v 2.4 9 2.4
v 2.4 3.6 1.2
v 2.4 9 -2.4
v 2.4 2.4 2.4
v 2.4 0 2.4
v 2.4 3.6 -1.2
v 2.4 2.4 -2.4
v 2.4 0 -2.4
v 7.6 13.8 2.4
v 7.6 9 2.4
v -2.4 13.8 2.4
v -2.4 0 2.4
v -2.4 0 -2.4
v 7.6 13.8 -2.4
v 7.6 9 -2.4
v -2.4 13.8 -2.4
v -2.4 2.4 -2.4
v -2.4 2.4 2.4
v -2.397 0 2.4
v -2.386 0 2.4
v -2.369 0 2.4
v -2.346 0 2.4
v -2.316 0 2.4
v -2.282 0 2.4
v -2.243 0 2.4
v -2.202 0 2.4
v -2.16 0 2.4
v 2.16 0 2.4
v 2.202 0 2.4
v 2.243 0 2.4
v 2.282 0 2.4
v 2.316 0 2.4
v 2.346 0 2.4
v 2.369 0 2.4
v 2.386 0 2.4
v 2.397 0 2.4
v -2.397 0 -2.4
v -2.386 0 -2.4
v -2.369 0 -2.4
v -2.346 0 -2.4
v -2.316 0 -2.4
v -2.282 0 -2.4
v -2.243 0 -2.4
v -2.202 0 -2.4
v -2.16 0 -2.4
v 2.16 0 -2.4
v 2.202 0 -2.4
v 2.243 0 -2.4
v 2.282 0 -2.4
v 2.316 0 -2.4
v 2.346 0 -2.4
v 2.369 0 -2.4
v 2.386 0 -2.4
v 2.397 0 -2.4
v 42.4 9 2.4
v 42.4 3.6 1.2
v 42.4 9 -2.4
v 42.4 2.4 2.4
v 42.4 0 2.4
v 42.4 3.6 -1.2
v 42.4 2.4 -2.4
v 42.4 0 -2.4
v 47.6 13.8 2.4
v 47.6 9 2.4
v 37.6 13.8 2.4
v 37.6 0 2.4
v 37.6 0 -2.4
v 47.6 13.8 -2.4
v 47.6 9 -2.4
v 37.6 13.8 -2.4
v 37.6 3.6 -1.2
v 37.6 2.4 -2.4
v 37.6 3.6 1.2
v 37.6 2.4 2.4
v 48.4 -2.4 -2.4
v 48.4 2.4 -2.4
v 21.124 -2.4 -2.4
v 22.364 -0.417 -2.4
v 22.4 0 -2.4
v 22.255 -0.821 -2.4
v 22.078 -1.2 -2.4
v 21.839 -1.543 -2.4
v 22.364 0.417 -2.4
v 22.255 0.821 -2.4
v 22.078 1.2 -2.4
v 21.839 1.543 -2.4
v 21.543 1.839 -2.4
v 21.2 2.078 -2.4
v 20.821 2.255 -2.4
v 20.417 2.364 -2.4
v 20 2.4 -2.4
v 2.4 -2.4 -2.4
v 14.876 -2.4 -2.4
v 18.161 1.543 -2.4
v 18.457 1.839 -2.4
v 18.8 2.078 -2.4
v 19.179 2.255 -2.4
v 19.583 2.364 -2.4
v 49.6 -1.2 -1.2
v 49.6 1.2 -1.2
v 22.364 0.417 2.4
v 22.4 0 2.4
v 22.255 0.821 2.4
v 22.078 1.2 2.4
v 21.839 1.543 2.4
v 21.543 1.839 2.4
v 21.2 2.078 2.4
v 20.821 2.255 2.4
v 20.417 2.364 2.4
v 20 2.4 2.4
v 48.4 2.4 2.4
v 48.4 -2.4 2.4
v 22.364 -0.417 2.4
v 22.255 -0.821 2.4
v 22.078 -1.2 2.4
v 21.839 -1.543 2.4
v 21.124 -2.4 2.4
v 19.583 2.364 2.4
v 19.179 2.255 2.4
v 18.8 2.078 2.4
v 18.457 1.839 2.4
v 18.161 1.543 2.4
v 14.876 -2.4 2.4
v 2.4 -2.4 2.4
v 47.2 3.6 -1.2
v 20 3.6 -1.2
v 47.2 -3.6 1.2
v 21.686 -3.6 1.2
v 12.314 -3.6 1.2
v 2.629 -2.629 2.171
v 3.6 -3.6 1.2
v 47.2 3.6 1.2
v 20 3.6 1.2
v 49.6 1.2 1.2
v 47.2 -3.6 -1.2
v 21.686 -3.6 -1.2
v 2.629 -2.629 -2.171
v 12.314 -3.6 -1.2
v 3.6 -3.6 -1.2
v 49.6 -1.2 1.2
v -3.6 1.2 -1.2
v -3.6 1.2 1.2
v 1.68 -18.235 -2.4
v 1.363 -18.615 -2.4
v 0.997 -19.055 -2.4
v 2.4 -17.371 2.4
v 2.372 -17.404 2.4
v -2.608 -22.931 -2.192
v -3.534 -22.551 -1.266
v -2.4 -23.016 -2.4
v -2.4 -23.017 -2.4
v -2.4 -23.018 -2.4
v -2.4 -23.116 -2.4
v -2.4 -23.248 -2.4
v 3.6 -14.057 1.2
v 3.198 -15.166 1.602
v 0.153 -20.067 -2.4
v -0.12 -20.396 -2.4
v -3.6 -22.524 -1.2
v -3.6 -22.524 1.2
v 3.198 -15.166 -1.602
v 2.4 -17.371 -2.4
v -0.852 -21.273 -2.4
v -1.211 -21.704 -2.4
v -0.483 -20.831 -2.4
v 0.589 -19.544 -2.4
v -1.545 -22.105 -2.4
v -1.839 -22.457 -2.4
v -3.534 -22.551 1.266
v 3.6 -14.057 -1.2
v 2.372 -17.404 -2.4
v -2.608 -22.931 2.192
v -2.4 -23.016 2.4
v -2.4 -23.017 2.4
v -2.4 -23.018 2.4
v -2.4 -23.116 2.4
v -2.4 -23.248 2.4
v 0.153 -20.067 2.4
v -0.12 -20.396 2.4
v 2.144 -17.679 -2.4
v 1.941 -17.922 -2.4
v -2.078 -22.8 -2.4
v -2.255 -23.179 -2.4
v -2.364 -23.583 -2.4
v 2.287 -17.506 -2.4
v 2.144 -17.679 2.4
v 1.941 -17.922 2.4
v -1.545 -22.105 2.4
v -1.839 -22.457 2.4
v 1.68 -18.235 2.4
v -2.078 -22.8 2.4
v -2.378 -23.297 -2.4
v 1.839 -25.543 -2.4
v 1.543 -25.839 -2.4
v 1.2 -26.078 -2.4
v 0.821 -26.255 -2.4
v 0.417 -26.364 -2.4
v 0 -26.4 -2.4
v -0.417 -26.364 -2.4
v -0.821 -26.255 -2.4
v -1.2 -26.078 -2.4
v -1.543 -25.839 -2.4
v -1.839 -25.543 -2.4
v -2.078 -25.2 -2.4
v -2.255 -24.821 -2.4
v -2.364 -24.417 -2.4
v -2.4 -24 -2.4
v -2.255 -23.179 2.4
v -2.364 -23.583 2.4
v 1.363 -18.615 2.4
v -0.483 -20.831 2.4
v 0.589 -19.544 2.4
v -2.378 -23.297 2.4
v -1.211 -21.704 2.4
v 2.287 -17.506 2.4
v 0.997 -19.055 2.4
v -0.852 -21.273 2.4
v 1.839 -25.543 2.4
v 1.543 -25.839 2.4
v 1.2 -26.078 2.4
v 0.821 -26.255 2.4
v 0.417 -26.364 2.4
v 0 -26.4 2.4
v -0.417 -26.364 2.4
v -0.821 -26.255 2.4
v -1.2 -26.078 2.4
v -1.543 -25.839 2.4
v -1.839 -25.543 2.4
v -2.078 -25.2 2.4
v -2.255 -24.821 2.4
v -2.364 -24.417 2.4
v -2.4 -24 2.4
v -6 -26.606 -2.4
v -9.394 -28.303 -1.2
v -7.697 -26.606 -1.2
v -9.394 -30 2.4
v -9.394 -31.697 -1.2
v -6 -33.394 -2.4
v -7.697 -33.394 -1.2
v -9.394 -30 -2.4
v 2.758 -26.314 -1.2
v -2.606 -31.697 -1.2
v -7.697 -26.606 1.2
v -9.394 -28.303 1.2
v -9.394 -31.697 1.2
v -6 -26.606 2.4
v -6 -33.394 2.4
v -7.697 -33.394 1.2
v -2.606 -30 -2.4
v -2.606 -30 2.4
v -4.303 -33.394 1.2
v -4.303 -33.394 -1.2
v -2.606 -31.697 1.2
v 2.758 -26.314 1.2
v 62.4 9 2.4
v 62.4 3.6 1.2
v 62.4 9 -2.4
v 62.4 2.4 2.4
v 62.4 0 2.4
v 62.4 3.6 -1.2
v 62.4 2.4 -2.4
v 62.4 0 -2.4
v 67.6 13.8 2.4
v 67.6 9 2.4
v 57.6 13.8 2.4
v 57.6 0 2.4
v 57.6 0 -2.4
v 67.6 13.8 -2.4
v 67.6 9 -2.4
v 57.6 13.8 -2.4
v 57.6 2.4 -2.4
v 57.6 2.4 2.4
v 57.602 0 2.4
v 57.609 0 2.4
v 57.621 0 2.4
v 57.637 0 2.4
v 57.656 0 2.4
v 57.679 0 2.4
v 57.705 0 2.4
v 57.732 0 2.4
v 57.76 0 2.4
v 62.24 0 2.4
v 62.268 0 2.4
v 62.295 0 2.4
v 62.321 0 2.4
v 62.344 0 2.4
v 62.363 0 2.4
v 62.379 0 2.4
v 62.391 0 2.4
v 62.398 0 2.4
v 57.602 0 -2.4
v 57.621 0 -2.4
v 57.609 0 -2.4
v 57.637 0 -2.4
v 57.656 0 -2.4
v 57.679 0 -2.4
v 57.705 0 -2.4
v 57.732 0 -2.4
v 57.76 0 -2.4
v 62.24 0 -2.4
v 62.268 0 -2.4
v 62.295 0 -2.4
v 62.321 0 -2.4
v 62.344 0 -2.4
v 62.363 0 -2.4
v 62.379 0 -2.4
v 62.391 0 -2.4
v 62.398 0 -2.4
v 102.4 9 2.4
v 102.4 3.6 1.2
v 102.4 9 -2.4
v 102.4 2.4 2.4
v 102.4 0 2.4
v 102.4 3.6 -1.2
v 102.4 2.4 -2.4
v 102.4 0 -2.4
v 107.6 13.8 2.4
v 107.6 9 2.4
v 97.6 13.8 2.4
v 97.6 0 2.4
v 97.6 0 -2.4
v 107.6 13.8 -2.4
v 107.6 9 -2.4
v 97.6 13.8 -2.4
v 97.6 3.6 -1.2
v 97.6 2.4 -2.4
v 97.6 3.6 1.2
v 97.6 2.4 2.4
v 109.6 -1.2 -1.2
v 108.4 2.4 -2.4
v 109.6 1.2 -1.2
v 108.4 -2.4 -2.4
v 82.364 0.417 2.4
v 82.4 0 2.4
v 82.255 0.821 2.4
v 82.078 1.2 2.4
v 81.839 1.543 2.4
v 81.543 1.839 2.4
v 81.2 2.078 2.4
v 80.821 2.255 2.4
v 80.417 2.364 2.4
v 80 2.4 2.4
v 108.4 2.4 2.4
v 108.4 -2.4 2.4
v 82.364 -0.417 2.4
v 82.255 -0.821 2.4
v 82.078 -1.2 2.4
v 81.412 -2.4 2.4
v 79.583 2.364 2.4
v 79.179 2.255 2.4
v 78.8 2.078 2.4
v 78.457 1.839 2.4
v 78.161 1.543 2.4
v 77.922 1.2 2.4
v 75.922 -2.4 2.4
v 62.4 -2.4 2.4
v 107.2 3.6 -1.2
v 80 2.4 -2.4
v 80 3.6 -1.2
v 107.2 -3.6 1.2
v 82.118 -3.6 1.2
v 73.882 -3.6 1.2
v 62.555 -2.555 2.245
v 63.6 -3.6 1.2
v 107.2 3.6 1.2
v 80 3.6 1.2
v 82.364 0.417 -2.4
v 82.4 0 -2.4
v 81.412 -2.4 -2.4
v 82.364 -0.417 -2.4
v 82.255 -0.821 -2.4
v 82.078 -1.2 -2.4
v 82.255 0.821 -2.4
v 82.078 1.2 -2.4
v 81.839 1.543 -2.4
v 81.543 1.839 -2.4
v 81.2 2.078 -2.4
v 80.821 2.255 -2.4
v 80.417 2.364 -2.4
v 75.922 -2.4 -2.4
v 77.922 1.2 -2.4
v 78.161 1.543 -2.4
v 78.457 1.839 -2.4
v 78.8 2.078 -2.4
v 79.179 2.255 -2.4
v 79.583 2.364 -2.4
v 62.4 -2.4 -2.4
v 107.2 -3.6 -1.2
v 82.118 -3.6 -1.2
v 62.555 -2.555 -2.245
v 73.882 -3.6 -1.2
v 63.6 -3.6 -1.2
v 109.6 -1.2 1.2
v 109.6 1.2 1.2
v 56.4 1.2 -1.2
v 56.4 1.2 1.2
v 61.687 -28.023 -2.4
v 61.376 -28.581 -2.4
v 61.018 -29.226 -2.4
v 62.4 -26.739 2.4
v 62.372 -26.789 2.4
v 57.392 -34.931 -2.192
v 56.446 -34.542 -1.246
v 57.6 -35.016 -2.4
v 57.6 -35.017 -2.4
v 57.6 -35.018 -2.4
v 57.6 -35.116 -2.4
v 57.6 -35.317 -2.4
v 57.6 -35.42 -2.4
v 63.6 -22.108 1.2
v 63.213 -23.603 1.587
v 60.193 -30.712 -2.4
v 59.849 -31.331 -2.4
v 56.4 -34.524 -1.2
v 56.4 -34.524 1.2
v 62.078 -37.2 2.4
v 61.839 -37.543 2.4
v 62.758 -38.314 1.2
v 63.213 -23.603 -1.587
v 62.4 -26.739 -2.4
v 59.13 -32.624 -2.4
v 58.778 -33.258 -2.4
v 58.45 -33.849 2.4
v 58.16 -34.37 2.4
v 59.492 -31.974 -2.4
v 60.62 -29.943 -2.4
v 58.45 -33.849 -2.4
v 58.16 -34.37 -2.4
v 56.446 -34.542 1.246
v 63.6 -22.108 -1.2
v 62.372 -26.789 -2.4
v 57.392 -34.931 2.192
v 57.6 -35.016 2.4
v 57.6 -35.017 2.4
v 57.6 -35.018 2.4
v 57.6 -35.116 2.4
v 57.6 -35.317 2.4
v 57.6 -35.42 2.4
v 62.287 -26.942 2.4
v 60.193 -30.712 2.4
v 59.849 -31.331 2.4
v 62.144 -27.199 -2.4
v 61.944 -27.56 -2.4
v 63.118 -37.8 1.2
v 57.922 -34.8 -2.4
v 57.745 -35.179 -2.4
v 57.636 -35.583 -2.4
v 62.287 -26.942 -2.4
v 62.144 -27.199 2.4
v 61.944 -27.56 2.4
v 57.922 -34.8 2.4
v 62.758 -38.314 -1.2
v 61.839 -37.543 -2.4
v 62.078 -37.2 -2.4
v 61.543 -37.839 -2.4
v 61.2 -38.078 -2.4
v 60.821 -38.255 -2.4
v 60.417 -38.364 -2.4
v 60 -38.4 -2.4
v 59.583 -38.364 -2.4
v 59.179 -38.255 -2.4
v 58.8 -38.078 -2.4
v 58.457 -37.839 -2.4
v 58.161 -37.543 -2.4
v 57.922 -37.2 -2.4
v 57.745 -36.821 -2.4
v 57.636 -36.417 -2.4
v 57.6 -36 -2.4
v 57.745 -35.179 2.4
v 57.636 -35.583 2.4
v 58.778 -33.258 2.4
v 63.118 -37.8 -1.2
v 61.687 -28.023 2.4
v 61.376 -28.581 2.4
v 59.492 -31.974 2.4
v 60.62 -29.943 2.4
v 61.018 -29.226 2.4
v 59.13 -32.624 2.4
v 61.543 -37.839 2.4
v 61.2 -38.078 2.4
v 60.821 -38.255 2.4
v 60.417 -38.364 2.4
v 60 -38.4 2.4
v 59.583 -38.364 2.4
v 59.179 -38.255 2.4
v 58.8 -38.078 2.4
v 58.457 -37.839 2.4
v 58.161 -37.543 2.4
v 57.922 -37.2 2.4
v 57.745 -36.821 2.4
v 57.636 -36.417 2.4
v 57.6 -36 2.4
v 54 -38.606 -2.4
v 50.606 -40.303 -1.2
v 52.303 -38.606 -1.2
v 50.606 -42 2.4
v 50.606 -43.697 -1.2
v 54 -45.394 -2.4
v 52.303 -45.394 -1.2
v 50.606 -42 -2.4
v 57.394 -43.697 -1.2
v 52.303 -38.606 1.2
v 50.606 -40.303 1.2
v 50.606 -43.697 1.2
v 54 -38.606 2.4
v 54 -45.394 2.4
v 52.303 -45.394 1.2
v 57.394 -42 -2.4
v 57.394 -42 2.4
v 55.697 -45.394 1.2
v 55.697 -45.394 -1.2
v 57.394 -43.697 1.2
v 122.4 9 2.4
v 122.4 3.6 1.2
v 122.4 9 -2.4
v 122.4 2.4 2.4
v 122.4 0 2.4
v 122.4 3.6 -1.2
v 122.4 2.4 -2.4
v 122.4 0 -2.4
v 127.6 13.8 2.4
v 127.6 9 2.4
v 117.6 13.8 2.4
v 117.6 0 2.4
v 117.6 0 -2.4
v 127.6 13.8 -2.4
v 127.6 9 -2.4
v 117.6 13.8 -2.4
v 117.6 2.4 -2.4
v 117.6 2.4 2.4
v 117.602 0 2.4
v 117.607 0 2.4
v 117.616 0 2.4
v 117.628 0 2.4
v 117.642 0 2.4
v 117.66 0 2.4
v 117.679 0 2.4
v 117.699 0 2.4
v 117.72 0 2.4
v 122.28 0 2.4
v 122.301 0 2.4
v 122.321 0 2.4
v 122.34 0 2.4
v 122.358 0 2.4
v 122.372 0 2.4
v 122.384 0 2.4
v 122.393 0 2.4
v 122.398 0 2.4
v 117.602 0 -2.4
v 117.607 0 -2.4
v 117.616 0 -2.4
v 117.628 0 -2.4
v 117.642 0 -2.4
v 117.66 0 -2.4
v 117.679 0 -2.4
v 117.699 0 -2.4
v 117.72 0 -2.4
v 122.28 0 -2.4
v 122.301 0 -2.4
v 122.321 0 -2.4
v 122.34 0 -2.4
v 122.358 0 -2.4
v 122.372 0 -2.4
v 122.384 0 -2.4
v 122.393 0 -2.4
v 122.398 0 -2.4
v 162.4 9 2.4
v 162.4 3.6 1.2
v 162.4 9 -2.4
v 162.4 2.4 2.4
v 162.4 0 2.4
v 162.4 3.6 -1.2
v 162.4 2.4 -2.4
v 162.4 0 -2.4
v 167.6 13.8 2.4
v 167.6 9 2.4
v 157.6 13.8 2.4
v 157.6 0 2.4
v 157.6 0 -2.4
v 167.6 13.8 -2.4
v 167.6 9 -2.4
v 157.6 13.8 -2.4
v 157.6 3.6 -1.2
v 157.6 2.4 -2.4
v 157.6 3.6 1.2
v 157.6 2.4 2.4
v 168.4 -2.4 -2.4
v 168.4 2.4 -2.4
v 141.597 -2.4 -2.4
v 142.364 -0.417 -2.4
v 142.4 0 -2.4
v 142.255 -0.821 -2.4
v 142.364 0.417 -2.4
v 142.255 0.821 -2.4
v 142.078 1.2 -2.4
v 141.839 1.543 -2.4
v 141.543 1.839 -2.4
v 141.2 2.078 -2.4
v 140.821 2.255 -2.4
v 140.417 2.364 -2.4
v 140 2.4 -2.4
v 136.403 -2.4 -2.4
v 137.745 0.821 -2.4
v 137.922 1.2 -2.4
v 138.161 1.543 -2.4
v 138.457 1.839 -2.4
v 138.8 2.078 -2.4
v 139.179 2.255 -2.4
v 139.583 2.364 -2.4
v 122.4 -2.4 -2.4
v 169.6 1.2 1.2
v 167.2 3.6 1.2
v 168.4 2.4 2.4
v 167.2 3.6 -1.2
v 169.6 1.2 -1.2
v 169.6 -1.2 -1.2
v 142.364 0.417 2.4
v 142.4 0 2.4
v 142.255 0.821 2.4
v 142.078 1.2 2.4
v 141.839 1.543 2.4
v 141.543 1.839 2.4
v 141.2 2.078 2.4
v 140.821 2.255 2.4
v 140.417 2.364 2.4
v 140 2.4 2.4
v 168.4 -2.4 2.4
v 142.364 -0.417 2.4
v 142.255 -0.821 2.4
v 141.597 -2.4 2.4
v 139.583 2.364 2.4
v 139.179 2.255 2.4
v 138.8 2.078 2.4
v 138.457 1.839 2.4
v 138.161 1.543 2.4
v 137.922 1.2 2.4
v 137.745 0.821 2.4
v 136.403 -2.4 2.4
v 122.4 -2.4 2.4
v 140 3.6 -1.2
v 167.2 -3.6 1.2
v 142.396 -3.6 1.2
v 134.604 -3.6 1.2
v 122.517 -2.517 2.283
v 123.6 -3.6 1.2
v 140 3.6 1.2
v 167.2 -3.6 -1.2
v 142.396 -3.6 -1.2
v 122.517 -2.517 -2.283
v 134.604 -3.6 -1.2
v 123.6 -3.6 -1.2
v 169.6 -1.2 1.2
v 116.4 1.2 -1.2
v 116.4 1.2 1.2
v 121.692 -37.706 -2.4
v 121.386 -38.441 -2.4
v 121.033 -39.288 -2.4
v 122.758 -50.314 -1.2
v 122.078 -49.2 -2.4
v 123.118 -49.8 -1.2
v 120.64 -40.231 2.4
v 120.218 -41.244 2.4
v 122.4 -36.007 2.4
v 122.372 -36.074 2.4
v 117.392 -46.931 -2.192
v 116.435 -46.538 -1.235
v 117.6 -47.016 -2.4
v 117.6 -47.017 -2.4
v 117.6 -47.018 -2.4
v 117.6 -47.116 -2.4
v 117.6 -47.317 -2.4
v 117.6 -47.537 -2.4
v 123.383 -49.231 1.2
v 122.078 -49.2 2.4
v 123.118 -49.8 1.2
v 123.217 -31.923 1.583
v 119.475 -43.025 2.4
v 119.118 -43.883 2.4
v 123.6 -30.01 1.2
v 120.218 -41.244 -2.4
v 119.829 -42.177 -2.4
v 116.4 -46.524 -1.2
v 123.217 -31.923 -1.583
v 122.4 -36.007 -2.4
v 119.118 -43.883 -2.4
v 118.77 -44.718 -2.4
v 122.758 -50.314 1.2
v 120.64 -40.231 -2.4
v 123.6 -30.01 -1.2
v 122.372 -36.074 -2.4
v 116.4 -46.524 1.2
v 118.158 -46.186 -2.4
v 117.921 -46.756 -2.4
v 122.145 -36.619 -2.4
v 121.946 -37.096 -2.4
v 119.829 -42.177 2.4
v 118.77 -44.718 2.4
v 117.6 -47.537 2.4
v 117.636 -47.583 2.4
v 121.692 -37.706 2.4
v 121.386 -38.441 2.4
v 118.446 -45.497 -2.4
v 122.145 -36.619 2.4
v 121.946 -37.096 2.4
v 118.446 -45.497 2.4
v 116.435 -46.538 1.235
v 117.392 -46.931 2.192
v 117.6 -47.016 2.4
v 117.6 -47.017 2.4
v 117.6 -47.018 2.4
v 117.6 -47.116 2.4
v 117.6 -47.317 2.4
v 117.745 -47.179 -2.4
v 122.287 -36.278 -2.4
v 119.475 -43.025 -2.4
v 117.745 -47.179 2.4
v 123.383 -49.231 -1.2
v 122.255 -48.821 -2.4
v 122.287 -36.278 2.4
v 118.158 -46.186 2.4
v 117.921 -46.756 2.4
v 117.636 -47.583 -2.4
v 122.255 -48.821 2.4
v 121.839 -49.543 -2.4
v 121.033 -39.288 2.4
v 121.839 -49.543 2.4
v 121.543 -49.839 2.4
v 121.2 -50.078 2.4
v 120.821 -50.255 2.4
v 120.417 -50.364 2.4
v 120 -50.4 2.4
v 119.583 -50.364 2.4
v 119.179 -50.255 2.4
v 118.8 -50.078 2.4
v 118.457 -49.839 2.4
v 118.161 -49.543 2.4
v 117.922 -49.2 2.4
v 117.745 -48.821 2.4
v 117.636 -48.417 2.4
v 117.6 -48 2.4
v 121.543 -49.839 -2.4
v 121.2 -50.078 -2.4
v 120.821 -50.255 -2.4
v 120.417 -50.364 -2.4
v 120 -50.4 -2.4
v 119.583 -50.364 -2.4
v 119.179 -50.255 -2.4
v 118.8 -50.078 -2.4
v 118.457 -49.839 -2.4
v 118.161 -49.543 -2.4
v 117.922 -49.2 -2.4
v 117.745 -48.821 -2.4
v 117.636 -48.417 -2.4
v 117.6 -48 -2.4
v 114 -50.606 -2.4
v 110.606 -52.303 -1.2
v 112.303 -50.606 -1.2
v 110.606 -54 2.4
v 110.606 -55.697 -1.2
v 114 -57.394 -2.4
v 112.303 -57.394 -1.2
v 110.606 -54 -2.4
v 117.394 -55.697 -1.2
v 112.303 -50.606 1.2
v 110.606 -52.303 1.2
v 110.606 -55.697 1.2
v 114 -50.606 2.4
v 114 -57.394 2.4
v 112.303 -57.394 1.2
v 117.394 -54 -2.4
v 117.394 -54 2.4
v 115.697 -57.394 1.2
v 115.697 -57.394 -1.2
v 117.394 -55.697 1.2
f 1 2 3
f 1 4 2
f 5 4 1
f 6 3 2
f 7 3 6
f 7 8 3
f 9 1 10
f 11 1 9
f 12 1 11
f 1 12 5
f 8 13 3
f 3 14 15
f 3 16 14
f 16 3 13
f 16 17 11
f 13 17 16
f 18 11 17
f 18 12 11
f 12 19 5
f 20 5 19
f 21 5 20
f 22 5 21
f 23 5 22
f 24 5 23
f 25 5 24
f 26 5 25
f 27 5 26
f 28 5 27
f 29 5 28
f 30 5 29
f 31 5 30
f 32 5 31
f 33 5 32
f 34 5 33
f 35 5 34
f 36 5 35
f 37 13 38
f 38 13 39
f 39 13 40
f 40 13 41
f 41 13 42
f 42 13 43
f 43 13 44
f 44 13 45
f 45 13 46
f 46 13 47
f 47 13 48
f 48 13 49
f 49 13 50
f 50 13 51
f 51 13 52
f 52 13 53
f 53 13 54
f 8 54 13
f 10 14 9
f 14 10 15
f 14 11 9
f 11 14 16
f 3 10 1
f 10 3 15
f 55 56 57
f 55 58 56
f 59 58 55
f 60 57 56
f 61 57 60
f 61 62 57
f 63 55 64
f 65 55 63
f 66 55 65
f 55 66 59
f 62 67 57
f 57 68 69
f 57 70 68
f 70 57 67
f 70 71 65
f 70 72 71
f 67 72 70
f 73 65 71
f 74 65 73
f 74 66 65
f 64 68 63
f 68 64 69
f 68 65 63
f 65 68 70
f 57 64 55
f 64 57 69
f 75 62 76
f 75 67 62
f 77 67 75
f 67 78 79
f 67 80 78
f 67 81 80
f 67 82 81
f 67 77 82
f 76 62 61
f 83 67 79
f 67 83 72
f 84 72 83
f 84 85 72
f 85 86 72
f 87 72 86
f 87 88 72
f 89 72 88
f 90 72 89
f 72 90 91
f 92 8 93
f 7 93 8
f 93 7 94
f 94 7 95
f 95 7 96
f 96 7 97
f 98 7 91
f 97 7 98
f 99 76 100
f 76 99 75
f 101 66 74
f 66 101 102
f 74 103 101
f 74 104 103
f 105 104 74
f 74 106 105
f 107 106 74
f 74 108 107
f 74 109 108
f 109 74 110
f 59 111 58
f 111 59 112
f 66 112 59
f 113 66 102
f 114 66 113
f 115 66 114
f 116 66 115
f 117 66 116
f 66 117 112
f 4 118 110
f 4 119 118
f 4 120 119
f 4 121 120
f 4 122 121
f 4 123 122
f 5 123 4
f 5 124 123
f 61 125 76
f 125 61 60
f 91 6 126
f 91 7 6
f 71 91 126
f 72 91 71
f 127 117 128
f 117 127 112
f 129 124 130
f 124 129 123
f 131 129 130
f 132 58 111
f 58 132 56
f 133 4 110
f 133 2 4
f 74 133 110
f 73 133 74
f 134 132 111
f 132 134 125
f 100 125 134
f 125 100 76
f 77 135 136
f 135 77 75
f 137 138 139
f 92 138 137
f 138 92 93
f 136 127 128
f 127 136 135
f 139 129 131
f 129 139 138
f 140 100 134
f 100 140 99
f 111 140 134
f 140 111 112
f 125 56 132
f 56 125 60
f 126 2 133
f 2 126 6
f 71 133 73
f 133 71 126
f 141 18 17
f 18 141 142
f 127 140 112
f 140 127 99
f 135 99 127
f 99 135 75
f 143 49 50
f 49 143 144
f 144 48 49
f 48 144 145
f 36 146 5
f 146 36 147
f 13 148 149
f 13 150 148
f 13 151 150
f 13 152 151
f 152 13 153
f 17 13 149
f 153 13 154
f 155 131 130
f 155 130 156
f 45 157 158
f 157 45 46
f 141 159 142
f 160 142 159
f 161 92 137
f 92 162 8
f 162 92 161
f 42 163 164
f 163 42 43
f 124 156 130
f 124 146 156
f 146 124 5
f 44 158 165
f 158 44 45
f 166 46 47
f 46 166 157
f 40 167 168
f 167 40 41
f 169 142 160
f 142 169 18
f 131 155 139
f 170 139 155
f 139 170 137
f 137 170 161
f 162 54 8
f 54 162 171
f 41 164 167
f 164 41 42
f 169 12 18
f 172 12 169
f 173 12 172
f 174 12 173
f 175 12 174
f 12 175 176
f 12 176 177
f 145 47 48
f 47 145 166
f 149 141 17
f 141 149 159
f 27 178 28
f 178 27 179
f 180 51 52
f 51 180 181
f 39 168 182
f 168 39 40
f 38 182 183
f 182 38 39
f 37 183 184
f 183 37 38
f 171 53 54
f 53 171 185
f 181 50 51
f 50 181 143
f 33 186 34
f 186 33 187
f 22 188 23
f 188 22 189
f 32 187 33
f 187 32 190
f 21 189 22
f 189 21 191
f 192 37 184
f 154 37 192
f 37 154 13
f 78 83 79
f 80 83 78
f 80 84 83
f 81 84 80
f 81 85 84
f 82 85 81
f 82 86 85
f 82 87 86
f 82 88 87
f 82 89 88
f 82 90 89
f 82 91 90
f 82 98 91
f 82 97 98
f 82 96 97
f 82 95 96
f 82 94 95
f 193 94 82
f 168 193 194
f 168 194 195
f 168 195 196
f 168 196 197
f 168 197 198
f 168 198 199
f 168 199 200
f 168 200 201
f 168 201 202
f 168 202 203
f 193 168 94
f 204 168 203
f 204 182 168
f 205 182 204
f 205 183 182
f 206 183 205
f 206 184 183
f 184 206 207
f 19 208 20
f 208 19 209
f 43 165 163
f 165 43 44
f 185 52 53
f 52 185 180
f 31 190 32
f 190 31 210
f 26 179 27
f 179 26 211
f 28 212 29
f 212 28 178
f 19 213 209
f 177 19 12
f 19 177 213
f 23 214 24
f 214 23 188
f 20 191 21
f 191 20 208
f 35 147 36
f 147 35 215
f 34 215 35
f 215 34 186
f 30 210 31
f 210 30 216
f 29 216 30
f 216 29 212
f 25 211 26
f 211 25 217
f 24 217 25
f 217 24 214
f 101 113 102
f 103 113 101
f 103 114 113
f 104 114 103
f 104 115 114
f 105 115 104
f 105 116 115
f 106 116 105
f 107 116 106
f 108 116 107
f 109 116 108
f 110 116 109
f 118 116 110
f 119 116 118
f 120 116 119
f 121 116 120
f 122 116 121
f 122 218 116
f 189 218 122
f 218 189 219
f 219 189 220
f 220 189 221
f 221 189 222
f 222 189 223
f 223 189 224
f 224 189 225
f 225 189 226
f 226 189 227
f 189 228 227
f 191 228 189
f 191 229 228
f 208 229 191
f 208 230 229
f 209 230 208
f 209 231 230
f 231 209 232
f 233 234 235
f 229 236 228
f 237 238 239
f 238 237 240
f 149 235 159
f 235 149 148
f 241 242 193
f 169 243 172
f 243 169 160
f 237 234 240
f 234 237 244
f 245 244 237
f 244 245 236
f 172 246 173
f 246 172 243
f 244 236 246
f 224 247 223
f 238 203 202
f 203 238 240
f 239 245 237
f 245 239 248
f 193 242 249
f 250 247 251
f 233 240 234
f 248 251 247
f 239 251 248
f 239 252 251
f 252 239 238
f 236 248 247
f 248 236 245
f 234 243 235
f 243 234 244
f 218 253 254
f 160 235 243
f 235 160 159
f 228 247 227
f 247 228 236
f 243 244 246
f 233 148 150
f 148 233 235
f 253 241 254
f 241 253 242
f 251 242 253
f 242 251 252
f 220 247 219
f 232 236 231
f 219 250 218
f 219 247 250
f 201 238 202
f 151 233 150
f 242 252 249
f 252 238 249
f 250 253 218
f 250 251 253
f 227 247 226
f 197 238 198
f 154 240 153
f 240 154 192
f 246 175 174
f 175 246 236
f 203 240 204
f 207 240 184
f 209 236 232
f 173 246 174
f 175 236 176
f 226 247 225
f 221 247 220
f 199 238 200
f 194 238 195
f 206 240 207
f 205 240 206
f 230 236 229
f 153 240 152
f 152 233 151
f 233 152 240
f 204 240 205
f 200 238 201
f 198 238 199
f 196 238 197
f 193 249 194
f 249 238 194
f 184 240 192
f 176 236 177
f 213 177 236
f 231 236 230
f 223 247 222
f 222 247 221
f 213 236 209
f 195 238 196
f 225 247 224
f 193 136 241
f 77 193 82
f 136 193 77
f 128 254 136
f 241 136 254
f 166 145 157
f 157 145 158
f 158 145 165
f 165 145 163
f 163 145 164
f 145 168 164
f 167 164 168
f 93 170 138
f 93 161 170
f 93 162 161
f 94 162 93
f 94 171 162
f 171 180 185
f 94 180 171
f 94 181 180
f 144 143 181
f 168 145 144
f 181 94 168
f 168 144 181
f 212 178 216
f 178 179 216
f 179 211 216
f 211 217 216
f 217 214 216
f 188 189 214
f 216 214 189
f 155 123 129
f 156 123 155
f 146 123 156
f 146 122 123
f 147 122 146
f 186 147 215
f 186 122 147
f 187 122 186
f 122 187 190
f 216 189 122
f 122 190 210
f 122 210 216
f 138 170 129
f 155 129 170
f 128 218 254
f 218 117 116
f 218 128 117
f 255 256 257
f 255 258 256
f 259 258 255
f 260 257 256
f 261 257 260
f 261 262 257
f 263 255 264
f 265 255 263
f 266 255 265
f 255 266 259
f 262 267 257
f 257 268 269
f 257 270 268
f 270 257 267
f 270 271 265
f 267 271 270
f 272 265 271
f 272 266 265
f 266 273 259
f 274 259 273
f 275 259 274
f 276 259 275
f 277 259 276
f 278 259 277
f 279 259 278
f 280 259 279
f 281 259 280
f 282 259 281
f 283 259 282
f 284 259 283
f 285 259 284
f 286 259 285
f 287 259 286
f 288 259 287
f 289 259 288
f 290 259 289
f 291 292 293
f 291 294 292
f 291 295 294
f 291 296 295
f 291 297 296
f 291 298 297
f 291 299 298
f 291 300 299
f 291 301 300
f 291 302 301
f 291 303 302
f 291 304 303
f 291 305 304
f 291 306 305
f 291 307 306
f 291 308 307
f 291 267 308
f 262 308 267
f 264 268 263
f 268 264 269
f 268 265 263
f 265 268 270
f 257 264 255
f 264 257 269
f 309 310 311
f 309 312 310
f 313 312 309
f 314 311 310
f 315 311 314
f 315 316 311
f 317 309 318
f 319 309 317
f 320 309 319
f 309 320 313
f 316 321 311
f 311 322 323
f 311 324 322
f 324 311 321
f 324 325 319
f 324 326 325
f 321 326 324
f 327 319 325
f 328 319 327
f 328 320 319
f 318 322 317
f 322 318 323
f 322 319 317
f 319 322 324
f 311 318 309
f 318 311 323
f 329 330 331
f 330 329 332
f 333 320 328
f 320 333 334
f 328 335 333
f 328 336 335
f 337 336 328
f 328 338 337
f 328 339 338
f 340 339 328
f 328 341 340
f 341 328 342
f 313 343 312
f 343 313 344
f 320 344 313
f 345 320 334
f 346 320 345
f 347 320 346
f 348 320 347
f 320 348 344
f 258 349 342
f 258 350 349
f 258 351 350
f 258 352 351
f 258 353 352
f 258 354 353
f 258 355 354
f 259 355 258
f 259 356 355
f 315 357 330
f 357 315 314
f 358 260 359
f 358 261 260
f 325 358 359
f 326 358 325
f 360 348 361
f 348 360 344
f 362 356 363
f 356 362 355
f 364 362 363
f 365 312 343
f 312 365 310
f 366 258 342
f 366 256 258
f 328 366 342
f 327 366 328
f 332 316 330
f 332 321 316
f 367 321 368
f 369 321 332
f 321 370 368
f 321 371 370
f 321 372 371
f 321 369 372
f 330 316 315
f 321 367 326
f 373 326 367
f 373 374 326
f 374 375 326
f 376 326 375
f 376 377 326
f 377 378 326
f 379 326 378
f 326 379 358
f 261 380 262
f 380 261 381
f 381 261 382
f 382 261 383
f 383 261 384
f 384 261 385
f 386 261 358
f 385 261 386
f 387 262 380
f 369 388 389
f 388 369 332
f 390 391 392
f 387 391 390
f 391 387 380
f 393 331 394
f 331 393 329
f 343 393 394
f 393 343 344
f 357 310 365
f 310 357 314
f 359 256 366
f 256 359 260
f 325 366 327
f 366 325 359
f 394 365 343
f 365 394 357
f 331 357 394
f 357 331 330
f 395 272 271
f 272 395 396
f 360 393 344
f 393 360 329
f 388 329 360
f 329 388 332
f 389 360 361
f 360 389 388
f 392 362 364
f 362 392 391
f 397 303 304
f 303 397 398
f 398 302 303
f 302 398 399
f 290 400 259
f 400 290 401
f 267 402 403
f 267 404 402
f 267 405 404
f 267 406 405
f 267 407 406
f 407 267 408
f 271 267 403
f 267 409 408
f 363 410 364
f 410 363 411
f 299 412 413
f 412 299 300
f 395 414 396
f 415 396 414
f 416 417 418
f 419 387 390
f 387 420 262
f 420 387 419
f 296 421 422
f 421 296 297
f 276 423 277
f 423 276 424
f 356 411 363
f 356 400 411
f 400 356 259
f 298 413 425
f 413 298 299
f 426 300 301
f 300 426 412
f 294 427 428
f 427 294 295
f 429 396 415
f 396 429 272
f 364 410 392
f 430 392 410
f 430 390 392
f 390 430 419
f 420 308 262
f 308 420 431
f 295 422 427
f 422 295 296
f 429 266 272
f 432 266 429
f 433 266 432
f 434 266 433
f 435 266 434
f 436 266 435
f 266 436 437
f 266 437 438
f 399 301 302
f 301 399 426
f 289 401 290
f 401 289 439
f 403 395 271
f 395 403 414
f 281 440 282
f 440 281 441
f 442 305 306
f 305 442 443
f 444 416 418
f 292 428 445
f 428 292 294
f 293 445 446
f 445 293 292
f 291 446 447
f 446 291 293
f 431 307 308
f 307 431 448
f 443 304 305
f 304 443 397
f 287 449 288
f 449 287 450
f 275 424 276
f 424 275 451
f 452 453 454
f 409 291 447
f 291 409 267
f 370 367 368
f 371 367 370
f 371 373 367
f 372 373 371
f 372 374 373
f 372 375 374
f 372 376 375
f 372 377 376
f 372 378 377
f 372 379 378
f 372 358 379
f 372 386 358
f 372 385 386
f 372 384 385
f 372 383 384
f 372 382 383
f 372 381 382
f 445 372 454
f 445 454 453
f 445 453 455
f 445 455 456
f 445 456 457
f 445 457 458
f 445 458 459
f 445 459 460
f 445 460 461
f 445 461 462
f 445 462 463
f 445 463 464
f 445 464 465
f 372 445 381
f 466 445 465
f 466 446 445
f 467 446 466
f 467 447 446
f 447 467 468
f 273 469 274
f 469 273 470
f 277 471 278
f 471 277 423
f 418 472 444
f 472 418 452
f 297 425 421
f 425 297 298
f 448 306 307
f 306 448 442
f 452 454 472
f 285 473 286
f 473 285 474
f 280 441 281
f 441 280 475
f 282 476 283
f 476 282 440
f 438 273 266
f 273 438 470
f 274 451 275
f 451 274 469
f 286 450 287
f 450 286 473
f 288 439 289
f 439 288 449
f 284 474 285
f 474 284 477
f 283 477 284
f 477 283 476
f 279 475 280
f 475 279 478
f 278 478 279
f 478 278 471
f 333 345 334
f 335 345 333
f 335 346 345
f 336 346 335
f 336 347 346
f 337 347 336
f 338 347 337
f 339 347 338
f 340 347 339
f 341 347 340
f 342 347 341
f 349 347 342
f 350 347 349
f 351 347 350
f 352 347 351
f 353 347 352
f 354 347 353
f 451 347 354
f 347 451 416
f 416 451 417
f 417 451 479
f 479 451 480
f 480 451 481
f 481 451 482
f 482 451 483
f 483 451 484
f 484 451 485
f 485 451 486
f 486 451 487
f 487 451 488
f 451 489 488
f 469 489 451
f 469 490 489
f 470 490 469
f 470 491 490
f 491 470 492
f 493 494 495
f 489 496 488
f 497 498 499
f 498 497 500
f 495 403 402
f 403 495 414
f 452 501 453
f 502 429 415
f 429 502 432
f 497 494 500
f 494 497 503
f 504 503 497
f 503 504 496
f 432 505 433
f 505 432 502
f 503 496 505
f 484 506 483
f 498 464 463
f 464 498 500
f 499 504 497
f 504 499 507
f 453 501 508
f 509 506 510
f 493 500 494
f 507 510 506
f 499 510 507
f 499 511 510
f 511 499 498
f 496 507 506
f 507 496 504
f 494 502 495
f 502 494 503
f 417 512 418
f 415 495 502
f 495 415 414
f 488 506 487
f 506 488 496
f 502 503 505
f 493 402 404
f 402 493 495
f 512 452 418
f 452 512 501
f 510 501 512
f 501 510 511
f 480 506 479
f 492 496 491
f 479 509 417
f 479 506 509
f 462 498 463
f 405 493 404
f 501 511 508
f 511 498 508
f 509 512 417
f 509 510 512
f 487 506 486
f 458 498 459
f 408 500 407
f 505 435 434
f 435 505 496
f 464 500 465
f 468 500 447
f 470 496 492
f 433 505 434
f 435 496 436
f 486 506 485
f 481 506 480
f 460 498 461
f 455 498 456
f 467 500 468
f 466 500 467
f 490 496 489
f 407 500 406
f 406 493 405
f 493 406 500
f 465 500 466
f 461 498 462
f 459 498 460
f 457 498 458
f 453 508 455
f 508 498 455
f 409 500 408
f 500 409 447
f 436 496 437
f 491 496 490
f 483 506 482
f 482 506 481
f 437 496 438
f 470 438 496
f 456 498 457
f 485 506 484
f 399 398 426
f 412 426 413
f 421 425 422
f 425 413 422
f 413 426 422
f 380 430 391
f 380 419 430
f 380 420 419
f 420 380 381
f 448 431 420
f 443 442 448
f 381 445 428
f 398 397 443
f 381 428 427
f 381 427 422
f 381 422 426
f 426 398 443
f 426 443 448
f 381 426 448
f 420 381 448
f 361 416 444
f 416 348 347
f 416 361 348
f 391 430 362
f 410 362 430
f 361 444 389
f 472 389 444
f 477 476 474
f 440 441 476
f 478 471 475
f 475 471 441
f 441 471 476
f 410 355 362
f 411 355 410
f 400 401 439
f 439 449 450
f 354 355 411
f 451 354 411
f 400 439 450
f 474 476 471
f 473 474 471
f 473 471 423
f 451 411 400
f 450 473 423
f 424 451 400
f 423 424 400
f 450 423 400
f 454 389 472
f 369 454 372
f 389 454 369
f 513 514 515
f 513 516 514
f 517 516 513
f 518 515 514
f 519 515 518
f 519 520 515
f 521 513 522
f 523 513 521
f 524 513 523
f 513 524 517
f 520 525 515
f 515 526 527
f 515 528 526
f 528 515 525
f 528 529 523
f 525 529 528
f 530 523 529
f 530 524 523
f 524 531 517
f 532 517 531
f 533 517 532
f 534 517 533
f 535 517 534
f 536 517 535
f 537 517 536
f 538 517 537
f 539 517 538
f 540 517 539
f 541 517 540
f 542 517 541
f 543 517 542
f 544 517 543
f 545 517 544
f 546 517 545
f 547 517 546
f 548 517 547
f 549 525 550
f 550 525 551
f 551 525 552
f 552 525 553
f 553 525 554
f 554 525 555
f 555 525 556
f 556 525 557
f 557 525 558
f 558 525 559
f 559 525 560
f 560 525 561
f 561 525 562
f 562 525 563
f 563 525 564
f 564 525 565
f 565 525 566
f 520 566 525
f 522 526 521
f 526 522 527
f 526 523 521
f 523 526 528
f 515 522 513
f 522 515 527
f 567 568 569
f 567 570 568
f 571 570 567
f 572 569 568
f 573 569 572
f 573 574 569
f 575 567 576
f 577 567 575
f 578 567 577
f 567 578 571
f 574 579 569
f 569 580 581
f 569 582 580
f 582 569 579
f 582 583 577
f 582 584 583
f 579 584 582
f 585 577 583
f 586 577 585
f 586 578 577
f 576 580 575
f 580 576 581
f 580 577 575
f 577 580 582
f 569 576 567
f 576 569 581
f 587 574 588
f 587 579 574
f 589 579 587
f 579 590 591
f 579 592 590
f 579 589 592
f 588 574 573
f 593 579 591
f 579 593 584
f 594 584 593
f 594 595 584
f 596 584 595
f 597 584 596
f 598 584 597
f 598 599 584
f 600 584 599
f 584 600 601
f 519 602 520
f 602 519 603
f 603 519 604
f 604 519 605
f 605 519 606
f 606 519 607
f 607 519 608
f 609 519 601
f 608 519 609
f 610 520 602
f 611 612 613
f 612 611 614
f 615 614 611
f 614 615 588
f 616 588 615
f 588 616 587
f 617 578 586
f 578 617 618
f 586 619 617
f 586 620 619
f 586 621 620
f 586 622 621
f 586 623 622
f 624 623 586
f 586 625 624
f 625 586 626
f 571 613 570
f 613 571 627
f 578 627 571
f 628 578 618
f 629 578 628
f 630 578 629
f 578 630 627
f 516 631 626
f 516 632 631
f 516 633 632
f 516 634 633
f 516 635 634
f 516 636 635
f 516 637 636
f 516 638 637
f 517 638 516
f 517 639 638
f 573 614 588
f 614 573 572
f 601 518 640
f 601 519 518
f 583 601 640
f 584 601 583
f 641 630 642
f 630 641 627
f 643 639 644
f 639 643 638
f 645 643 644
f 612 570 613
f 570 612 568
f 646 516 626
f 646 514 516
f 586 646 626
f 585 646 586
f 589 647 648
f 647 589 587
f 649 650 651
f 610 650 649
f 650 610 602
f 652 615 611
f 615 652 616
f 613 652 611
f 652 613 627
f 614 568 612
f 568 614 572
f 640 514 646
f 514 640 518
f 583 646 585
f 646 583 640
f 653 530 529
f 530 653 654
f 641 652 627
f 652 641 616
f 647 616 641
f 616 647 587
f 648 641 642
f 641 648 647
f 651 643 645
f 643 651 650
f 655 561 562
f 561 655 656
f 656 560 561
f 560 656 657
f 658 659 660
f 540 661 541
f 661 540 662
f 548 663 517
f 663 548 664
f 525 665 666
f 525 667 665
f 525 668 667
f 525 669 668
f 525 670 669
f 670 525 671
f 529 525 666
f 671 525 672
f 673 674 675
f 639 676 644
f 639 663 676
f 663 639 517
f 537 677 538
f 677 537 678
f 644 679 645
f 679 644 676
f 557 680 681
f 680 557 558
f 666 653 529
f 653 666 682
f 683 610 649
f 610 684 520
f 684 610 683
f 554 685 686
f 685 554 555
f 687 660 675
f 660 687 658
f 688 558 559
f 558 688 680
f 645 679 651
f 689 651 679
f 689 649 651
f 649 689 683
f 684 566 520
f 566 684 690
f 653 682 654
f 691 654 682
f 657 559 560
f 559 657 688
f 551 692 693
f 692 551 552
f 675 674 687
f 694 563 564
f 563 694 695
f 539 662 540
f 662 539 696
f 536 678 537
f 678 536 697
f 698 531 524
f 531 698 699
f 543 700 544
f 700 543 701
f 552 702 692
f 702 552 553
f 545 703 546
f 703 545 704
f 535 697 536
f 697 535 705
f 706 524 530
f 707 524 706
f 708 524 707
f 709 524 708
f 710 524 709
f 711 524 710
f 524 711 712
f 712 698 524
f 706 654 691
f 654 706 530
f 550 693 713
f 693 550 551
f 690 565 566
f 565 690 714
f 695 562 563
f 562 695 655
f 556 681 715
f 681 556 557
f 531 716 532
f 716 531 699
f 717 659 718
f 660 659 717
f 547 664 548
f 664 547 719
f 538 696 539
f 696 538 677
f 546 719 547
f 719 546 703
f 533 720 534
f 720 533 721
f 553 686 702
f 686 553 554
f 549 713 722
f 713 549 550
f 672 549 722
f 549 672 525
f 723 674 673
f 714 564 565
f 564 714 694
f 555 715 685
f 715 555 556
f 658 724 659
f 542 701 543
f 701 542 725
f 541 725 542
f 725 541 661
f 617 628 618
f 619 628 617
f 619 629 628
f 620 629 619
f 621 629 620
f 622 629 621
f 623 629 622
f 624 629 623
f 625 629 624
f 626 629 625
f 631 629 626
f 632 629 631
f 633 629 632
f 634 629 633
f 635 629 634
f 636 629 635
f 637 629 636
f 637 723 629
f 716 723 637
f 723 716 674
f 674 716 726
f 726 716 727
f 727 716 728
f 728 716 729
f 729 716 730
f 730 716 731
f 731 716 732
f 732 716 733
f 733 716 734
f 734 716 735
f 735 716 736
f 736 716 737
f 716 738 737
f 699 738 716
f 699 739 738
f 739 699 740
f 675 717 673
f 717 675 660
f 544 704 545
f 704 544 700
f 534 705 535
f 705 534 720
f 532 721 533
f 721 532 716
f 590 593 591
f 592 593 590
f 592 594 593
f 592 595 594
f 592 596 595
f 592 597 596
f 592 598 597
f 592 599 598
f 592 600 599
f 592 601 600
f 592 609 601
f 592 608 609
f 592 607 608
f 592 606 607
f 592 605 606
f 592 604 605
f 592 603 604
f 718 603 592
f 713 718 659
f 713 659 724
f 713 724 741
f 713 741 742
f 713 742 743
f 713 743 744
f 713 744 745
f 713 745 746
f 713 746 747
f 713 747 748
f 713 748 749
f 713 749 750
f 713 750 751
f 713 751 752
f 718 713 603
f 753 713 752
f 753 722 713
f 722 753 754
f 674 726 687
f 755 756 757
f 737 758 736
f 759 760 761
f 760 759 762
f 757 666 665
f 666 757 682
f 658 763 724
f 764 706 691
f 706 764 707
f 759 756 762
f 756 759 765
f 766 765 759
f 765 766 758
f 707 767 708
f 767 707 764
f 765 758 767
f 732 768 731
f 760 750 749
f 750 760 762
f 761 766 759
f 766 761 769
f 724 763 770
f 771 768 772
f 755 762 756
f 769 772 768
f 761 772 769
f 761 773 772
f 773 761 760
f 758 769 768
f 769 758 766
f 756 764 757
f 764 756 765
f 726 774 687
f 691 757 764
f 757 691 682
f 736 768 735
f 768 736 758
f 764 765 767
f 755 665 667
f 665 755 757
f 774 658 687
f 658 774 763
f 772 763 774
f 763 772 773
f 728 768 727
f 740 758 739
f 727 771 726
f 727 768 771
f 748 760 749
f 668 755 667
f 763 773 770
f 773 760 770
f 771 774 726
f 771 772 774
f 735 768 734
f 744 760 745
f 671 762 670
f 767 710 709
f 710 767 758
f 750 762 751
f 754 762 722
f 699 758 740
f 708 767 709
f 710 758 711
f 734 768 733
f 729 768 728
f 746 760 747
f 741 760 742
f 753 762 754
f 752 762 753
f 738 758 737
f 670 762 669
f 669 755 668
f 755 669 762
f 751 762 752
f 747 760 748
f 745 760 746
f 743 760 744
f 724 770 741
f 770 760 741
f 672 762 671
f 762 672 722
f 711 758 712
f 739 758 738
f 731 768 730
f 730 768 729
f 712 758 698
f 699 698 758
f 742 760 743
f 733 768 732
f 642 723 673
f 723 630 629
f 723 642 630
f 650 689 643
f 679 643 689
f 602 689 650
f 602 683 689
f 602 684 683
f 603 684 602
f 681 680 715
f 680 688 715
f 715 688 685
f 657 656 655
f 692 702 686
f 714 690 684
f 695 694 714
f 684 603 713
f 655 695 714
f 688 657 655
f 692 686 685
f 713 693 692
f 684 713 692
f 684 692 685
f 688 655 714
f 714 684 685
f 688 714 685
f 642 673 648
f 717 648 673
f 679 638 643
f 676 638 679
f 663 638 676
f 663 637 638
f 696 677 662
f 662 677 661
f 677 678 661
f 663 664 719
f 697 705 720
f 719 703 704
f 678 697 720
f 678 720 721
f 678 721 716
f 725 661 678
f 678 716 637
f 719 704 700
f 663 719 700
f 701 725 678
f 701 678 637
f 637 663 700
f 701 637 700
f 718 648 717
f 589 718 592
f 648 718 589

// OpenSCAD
// 穴: 5mm x 15mm
// 厚さ: 5.3mm
// 縦の距離: 40mm

fragments = 36;

hook1 = 24;
hook2 = 36;
hook3 = 48;


// module tip() {
//     translate([0, 0, 0])
//     rotate_extrude(angle = 360, convexity = 10, $fn = fragments) {
//         translate([0, 0, 0])
//         polygon([
//             [0, 2.4 + 1],
//             [1.4, 2.4 + 1],
//             [2.4, 2.4],
//             [2.4, -2.4],
//             [0, -2.4],
//         ]);
//     }
// }

// module hook48() {
//     translate([40, 6, 0])
//     cube([4.8, 12, 4.8], center=true);
//     translate([5 - 2.4 + 40, 5.4 + 4.8, 0])
//     cube([10, 4.8, 4.8], center=true);

//     translate([0, 6, 0])
//     cube([4.8, 12, 4.8], center=true);
//     translate([5 - 2.4, 5.4 + 4.8, 0])
//     cube([10, 4.8, 4.8], center=true);


//     // translate([0, -10, 0])
//     // cube([4.8, 20, 4.8], center=true);
//     len = 48;

//     union() {
//         hull() {
//             translate([0, 0, 0])
//             // cube([4.8, 4.8, 4.8], center=true);
//             tip();
//             translate([40, 0, 0])
//             // cylinder(h=4.8, r=2.4, center=true, $fn=fragments);
//             tip();
//         }
//         hull() {
//             translate([0, -len, 0])
//             // cylinder(h=4.8, r=2.4, center=true, $fn=fragments);
//             tip();
//             translate([-4.8, -len - 2.4, 0])
//             // cylinder(h=4.8, r=2.4, center=true, $fn=fragments);
//             tip();
//         }
//         hull() {
//             translate([0, -len, 0])
//             // cylinder(h=4.8, r=2.4, center=true, $fn=fragments);
//             tip();
//             translate([0, 0, 0])
//             // cylinder(h=4.8, r=2.4, center=true, $fn=fragments);
//             tip();
//         }
//         hull() {
//             translate([0, -len, 0])
//             // cylinder(h=4.8, r=2.4, center=true, $fn=fragments);
//             tip();
//             translate([20, 0, 0])
//             // cylinder(h=4.8, r=2.4, center=true, $fn=fragments);
//             tip();
//         }
//     }
    

// }
// translate([80, 0, -10])
// hook48();
// mirror([0, 1, 0])
// translate([80, -30, -10])
// hook48();


// module hook36() {
//     translate([40, 6, 0])
//     cube([4.8, 12, 4.8], center=true);
//     translate([5 - 2.4 + 40, 5.4 + 4.8, 0])
//     cube([10, 4.8, 4.8], center=true);

//     translate([0, 6, 0])
//     cube([4.8, 12, 4.8], center=true);

    
//     translate([5 - 2.4, 5.4 + 4.8, 0])
//     cube([10, 4.8, 4.8], center=true);


//     // translate([0, -10, 0])
//     // cube([4.8, 20, 4.8], center=true);
//     len = 36;

//     union() {
//         hull() {
//             translate([0, 0, 0])
//             // cube([4.8, 4.8, 4.8], center=true);
//             tip();
//             translate([40, 0, 0])
//             // cylinder(h=4.8, r=2.4, center=true, $fn=fragments);
//             tip();
//         }

//         hull() {
//             translate([0, -len, 0])
//             // cylinder(h=4.8, r=2.4, center=true, $fn=fragments);
//             tip();
//             translate([-4.8, -len - 2.4, 0])
//             // cylinder(h=4.8, r=2.4, center=true, $fn=fragments);
//             tip();
//         }
//         hull() {
//             translate([0, -len, 0])
//             // cylinder(h=4.8, r=2.4, center=true, $fn=fragments);
//             tip();
//             translate([0, 0, 0])
//             // cylinder(h=4.8, r=2.4, center=true, $fn=fragments);
//             tip();
//         }
//         hull() {
//             translate([0, -len, 0])
//             // cylinder(h=4.8, r=2.4, center=true, $fn=fragments);
//             tip();
//             translate([20, 0, 0])
//             // cylinder(h=4.8, r=2.4, center=true, $fn=fragments);
//             tip();
//         }
//     }
    

// }
// translate([0, 0, -10])
// hook36();
// mirror([0, 1, 0])
// translate([0, -30, -10])
// hook36();


// module hook24() {
//     translate([40, 6, 0])
//     cube([4.8, 12, 4.8], center=true);
//     translate([5 - 2.4 + 40, 5.4 + 4.8, 0])
//     cube([10, 4.8, 4.8], center=true);

//     translate([0, 6, 0])
//     cube([4.8, 12, 4.8], center=true);

//     translate([5 - 2.4, 5.4 + 4.8, 0])
//     cube([10, 4.8, 4.8], center=true);


//     // translate([0, -10, 0])
//     // cube([4.8, 20, 4.8], center=true);
//     len = 24;

//     union() {
//         hull() {
//             translate([0, 0, 0])
//             // cube([4.8, 4.8, 4.8], center=true);
//             tip();
//             translate([40, 0, 0])
//             // cylinder(h=4.8, r=2.4, center=true, $fn=fragments);
//             tip();
//         }
//         hull() {
//             translate([0, -len, 0])
//             // cylinder(h=4.8, r=2.4, center=true, $fn=fragments);
//             tip();
//             translate([-4.8, -len - 2.4, 0])
//             // cylinder(h=4.8, r=2.4, center=true, $fn=fragments);
//             tip();
//         }
//         hull() {
//             translate([0, -len, 0])
//             // cylinder(h=4.8, r=2.4, center=true, $fn=fragments);
//             tip();
//             translate([0, 0, 0])
//             // cylinder(h=4.8, r=2.4, center=true, $fn=fragments);
//             tip();
//         }
//         hull() {
//             translate([0, -len, 0])
//             // cylinder(h=4.8, r=2.4, center=true, $fn=fragments);
//             tip();
//             translate([20, 0, 0])
//             // cylinder(h=4.8, r=2.4, center=true, $fn=fragments);
//             tip();
//         }
//     }
    

// }
// translate([-80, 0, -10])
// hook24();
// mirror([0, 1, 0])
// translate([-80, -30, -10])
// hook24();

////////////////////////////////////////

module poly() {
    polygon([
        [1.2, 2.4 + 1.2],
        [2.4, 1.2 + 1.2],
        [2.4, -1.2 - 1.2],
        [1.2, -2.4 - 1.2],
        [-1.2, -2.4 - 1.2],
        [-2.4, -1.2 - 1.2],
        [-2.4, 1.2 + 1.2],
        [-1.2, 2.4 + 1.2],
    ]);
}

module xyz() {
    linear_extrude(height = 4.8, center = true, convexity = 10, $fn = fragments) {
        poly();
    }
}
module abc() {
    
    intersection() {
        xyz();
        rotate([0, 90, 0])
        xyz();

    }

}
module node() {
    union() {
        abc();
        rotate([0, 0, 90])
        abc();
    }
}




module curve() {
    rotate([90, 0, 0])
    rotate_extrude(angle = 90, convexity = 10, $fn = fragments) {
        translate([6, 0, 0])
        poly();
    }
}

module joint() {
    union() {
        translate([0, 0, 1.8])
        cylinder(h = 1.2, r1 = 2.4 + 1.2, r2 = 2.4, center = true, $fn = fragments);
        translate([0, 0, 0])
        cylinder(h = 2.4, r = 2.4 + 1.2, center = true, $fn = fragments);
        translate([0, 0, -1.8])
        cylinder(h = 1.2, r1 = 2.4, r2 = 2.4 + 1.2, center = true, $fn = fragments);
    }
}

module h(len) {
    translate([0, 6, 0])
    cube([4.8, 12, 4.8], center=true);
    translate([5 - 2.4 + 0, 5.4 + 4.8 + 1.2, 0])
    cube([10, 4.8, 4.8], center=true);
}

module hookBody(len) {
    hull() {
        translate([0, 0, 0])
        node();
        translate([40 + 6.0, 0, 0])
        node();
    }

    hull() {
        translate([0, 0, 0])
        node();
        translate([0, -len, 0])
        joint();
    }

    hull() {
        translate([0, -len, 0])
        joint();
        translate([0 - 6, -len - 6, 0])
        rotate([0, 0, 45])
        node();
    }

    hull() {
        translate([0, -len, 0])
        joint();
        translate([20, 0, 0])
        joint();
    }



    h();
    translate([40, 0, 0])
    h();
}

hookBody(hook1);

translate([60, 0, 0])
hookBody(hook2);

translate([120, 0, 0])
hookBody(hook3);
